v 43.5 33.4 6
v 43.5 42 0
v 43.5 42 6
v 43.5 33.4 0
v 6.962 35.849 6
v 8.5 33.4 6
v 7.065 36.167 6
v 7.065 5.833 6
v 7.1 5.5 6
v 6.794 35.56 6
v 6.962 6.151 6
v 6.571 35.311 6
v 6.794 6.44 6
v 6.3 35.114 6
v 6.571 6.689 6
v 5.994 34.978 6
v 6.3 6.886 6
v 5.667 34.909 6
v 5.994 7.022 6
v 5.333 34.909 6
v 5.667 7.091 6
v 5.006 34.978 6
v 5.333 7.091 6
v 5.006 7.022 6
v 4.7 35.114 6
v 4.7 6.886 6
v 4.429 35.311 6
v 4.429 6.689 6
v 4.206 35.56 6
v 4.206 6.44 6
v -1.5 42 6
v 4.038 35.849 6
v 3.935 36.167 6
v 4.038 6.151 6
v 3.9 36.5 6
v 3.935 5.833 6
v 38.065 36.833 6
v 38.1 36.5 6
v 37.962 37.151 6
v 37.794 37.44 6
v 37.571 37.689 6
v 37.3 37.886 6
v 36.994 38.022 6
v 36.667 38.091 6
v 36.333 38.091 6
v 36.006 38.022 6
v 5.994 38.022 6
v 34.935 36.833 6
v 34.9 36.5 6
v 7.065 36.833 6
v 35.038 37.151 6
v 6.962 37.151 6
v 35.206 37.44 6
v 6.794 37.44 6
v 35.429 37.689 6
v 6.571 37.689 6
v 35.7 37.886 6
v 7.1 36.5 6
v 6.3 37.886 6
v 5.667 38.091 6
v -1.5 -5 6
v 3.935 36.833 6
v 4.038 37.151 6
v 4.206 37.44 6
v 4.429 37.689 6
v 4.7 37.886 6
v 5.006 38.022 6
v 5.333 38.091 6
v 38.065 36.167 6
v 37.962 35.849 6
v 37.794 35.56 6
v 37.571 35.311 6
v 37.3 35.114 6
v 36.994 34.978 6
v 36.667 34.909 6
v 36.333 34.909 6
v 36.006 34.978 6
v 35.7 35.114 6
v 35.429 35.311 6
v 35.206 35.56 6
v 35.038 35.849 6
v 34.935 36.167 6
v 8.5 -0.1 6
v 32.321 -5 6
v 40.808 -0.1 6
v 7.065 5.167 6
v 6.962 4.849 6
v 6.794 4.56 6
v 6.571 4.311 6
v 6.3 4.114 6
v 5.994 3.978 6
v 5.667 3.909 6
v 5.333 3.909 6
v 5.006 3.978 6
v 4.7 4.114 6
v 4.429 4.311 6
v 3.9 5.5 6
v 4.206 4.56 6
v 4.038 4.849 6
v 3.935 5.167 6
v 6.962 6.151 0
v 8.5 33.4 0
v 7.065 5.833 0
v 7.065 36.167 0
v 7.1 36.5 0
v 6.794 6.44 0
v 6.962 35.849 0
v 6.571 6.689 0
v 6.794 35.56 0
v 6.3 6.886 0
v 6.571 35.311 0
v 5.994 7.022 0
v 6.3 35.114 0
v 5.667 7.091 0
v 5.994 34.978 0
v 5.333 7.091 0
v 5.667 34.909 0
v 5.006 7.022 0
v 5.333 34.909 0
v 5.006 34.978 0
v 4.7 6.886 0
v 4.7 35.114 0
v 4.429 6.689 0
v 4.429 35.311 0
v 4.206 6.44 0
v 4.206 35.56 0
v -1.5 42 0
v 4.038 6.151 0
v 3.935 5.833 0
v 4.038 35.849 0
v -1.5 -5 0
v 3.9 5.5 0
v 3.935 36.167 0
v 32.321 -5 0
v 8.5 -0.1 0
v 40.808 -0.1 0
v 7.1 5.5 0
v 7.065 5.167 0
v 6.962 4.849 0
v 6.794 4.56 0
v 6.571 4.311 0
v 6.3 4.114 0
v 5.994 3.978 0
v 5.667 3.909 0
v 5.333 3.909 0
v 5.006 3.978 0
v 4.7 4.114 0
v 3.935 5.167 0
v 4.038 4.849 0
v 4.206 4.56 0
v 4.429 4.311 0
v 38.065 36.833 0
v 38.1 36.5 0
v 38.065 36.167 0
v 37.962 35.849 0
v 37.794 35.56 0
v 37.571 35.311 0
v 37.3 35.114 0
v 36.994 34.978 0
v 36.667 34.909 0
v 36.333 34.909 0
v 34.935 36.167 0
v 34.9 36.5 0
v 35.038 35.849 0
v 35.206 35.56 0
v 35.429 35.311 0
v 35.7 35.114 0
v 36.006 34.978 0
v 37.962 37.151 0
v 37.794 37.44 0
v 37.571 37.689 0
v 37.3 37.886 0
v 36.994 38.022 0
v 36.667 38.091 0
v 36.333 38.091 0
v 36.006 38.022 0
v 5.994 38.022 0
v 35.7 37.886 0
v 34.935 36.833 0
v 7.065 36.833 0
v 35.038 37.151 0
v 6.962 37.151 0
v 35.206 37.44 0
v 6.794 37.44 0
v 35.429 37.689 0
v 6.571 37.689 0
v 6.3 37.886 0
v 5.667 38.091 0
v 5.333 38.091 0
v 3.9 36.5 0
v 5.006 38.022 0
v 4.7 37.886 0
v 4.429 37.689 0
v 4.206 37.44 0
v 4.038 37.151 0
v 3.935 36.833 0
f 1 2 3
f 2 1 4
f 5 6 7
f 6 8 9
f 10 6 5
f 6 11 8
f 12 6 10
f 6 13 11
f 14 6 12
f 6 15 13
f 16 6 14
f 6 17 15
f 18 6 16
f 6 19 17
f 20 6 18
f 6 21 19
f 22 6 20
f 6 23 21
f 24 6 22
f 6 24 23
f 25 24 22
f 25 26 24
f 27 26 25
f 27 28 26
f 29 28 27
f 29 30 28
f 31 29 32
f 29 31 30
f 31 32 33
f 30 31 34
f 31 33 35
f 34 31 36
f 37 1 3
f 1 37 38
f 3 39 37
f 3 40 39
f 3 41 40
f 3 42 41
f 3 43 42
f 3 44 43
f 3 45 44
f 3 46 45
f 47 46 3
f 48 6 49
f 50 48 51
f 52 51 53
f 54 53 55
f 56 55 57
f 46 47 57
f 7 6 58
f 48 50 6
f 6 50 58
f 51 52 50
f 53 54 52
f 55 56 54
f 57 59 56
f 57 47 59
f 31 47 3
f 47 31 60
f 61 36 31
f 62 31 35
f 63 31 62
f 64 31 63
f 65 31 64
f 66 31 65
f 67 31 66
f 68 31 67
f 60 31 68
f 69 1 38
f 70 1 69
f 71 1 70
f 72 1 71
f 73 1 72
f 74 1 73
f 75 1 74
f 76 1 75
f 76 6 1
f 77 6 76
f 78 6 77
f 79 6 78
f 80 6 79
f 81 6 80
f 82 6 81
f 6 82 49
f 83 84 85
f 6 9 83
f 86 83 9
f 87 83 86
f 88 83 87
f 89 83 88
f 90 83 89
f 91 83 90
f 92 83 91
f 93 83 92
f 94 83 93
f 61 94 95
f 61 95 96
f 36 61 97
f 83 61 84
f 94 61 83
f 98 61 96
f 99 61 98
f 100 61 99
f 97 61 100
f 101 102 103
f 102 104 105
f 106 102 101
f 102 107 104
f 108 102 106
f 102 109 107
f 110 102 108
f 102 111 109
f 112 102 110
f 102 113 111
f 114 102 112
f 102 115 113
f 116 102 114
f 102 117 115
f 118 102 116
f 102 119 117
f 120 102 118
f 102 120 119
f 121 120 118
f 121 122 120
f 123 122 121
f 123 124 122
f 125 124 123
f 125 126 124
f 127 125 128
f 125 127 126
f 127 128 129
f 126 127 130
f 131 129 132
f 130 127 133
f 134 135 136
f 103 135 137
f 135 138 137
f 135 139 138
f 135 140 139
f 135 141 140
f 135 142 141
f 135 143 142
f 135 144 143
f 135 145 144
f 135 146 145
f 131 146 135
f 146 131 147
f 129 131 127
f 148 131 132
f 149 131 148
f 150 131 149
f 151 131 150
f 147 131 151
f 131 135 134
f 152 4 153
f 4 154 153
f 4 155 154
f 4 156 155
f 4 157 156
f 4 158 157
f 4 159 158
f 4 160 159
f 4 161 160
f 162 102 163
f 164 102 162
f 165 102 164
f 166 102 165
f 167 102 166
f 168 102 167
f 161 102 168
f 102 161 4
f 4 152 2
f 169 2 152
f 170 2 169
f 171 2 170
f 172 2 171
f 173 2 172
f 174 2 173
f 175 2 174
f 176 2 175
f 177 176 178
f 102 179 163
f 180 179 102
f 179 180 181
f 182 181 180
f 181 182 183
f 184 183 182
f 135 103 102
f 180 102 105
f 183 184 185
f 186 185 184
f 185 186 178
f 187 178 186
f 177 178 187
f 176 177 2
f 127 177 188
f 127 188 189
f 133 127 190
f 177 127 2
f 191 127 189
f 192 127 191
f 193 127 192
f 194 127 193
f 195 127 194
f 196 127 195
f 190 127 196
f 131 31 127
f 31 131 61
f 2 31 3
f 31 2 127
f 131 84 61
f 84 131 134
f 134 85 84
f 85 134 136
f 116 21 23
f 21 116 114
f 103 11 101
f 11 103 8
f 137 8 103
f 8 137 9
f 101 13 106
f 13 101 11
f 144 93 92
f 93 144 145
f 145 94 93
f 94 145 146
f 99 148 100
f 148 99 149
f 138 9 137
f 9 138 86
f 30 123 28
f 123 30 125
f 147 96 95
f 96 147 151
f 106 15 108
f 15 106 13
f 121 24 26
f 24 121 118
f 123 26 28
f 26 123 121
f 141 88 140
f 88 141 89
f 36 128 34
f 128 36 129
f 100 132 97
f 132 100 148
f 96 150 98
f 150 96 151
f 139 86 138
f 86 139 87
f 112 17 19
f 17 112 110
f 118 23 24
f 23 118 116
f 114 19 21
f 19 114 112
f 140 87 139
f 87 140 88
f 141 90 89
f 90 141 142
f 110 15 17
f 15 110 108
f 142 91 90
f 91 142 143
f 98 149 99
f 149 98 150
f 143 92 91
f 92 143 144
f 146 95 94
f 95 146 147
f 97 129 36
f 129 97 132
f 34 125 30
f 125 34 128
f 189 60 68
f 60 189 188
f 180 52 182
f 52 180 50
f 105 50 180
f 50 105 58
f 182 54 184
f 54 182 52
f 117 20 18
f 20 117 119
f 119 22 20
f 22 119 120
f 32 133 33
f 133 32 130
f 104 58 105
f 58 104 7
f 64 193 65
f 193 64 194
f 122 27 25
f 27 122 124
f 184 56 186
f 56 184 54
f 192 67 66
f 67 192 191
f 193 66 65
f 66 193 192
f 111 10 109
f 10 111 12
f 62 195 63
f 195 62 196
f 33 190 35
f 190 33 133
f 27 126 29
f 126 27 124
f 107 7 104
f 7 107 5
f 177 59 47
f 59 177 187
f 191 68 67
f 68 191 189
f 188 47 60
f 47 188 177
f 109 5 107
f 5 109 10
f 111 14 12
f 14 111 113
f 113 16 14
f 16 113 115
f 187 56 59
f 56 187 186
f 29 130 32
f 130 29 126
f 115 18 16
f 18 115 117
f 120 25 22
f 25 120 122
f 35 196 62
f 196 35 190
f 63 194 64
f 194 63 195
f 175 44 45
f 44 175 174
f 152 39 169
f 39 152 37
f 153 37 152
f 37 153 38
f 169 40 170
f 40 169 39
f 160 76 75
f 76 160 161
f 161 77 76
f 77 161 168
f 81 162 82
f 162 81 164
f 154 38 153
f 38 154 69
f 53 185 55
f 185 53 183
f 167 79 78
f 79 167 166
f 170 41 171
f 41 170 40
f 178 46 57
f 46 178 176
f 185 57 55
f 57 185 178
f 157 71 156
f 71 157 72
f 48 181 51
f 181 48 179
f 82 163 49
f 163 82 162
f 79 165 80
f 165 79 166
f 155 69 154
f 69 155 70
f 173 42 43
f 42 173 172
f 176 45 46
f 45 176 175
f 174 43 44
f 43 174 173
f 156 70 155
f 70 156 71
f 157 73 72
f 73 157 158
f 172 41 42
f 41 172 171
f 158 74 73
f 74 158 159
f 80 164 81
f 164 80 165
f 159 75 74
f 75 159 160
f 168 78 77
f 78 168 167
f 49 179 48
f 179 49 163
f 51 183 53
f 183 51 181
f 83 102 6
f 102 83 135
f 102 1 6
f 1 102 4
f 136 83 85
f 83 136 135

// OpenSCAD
// file: metric.scad
// PRUSA Mendel  
// Default metric sizes
// GNU GPL v2
// Josef Průša
// josefprusa@me.com
// prusadjs.cz
// http://www.reprap.org/wiki/Prusa_Mendel
// http://github.com/prusajr/PrusaMendel

// DONT CHANGE THIS FILE! ALTER VALUES IN CONFIGURATION.SCAD INSTEAD

// RODS

threaded_rod_diameter = 8;
threaded_rod_diameter_horizontal = 8;
smooth_bar_diameter = 8;
smooth_bar_diameter_horizontal = 8;

// Nuts and bolts

m8_diameter = 8;
m8_nut_diameter = 14.5;

m4_diameter = 4;
m4_nut_diameter = 7.5;

m3_diameter = 3;
m3_nut_diameter = 5;

// Bushing holder

bushing_core_diameter = smooth_bar_diameter;
bushing_material_thickness = 1;

// Motors

motor_shaft = 5.1;
// file: y-motor-bracket-univy.scad
// C. Strang		
// cstrang@????
// funfor.us
// f. beachler
// longevity software d.b.a. terawatt industries

include <metric.scad>;

h = 5;   	// base thickness
hh=6;
o = 0.1;	//  overlap amount
w=2.5;			// wall thickness
fmp = true;	// four mount points
st=2;

m3=m3_diameter + 0.2; 
m4=m4_diameter + 0.2; 
m8 = smooth_bar_diameter_horizontal;

$fn=30;

translate([0,0,0]) ymotormount();

module ymotormount()
{
	translate([0, 5, 0]) rotate([0, 0, 0]) nema17motormount(h,fmp);
	translate([0, 10, 0]) rotate([0,0,0]) walls();
}


module nema17motormount(pt, mp)
{
	difference()
	{
		union()
		{
			difference()
			{
				translate([-1.5, -5, 0]) rotate([0,0,0]) cube([42 + 3, 47, pt]);
		
				translate([21,21,-0.1]) cylinder(r=12,h=pt+2*o);
				if (mp==false)
				{
					translate([28,-0.1,-o])  cube([25,30,21]);
					translate([3,-0.1,-o])  cube([36,15,21]);
				} else {
					translate([55, -15, -o]) rotate([0, 0, 120]) cube([20, 20, 10]);
				}
		
			}
			
			if (mp==false) difference()
			{
				translate([35.6,32.6,0]) cylinder(r=7.3,h=pt);
				translate([42,28,-o]) cube([5,10,pt+2*o]);
				translate([28,30,-o]) cube([17,10,pt+2*o]);
			}
		
			if (mp==false) translate([1,0,0]) difference()
			{
				translate([2.6,9.3,0]) cylinder(r=9.3,h=pt);
				translate([-8,0,-o]) cube([7,20,pt+2*o]);
			}
		}
		translate([5.5,5.5,-o]) cylinder(r=m3/2,h=pt+2*o);
		translate([5.5,36.5,-o]) cylinder(r=m3/2,h=pt+2*o);
		translate([36.5,36.5,-o]) cylinder(r=m3/2,h=pt+2*o);
		if (mp==true)
		{
			translate([36.5,5.5,-o]) cylinder(r=m3/2,h=pt+2*o);
	
		}
	}
}


module walls()
{
	// fill-in space between bottom wall and nema mount
	//translate([0,0,0]) rotate([0,0,0]) cube([30, 42, 5]);
	// nema mount wall
	difference()
	{
			translate([42, 0, 0]) rotate([0,0,0]) cube([h+o, 42, 20]);
			translate([-o + 42, 0, h]) rotate([atan(20/42),0,0]) cube([h+3*o, 47, 25]);
	}
	// support between bottom and nema mount walls
	translate([47, 37, 0]) rotate([0, 0, 90]) cube([h + o, 52,20]);
	// bottom wall
	difference()
	{
			translate([-5, 0, 0]) rotate([0,0,0]) cube([h+o, 42, 20]);
			translate([-o - 5, 0, h]) rotate([atan(20/42),0,0]) cube([h+3*o, 47, 25]);
	}
	// extrusion wall
	difference()
	{
			translate([h,42,0]) rotate([0,0,0]) cube([hh,20,20]);
			translate([h-o,62,12.5]) rotate([atan(1),0,0]) cube([hh+2*o,20,25]);
			translate([h - o, 54, 12]) rotate([0,90,0]) cylinder(r = m4 / 2 , h = hh * 2 + 2*o);
	}
	// extrusion wall support
	difference()
	{
			translate([-h, 42, 0]) rotate([0,0,0]) cube([16,20,h]);
			translate([-h - 8.7, 52, -o]) rotate([0,0,-atan(10/15)]) mirror([0,0,0]) cube([10,20,h+3*o]);
	}
	difference()
	{
			translate([-h, 42, 0]) rotate([0, 0, 0]) cube([16, h, 20]);
			translate([-h - 14, 42 - o, h + 8 + o]) rotate([0, atan(10/15), 0]) mirror([0,0,0]) cube([16,h+3*o,20]);
	}
	// extrusion wall support
	difference()
	{
			translate([31,42,0]) rotate([0,0,0]) cube([16,20,h]);
			translate([47,47,-o]) rotate([0,0,atan(10/15)]) mirror([0,0,0]) cube([10,20,h+3*o]);
	}
	// extrusion wall
	difference()
	{
			translate([31,42,0]) rotate([0,0,0]) cube([hh,20,20]);
			translate([31-o,62,12.5]) rotate([atan(1),0,0]) cube([hh+2*o,20,25]);
			// m4 screw hole
			translate([31 - o, 54, 12]) rotate([0,90,0]) cylinder(r = m4 / 2, h = hh * 2 + 2*o);
	}
	// extrusion wall support
	difference()
	{
			translate([31,42,0]) rotate([0,0,0]) cube([16,h,20]);
			translate([47,42-o,h]) rotate([0,-atan(10/15),0]) mirror([0,0,0]) cube([16,h+3*o,20]);
	}
	// t-slot guide
	translate([18.5,42,0]) rotate([0,0,0]) cube([5, st, h + 15]);
}
// main file
// C. Strang		
// cstrang@????
// funfor.us

use <y-motor-bracket-univy.scad>;

h = 6;   	// base thickness
fmp = true;	// four mount points


$fn=30;

translate([0,0,0]) nema17spacer();

module nema17spacer()
{
	difference()
	{
		nema17motormount(h,fmp);
		translate([8.5,-.1,-.1]) cube([40,33.5,10]);
	}
}
